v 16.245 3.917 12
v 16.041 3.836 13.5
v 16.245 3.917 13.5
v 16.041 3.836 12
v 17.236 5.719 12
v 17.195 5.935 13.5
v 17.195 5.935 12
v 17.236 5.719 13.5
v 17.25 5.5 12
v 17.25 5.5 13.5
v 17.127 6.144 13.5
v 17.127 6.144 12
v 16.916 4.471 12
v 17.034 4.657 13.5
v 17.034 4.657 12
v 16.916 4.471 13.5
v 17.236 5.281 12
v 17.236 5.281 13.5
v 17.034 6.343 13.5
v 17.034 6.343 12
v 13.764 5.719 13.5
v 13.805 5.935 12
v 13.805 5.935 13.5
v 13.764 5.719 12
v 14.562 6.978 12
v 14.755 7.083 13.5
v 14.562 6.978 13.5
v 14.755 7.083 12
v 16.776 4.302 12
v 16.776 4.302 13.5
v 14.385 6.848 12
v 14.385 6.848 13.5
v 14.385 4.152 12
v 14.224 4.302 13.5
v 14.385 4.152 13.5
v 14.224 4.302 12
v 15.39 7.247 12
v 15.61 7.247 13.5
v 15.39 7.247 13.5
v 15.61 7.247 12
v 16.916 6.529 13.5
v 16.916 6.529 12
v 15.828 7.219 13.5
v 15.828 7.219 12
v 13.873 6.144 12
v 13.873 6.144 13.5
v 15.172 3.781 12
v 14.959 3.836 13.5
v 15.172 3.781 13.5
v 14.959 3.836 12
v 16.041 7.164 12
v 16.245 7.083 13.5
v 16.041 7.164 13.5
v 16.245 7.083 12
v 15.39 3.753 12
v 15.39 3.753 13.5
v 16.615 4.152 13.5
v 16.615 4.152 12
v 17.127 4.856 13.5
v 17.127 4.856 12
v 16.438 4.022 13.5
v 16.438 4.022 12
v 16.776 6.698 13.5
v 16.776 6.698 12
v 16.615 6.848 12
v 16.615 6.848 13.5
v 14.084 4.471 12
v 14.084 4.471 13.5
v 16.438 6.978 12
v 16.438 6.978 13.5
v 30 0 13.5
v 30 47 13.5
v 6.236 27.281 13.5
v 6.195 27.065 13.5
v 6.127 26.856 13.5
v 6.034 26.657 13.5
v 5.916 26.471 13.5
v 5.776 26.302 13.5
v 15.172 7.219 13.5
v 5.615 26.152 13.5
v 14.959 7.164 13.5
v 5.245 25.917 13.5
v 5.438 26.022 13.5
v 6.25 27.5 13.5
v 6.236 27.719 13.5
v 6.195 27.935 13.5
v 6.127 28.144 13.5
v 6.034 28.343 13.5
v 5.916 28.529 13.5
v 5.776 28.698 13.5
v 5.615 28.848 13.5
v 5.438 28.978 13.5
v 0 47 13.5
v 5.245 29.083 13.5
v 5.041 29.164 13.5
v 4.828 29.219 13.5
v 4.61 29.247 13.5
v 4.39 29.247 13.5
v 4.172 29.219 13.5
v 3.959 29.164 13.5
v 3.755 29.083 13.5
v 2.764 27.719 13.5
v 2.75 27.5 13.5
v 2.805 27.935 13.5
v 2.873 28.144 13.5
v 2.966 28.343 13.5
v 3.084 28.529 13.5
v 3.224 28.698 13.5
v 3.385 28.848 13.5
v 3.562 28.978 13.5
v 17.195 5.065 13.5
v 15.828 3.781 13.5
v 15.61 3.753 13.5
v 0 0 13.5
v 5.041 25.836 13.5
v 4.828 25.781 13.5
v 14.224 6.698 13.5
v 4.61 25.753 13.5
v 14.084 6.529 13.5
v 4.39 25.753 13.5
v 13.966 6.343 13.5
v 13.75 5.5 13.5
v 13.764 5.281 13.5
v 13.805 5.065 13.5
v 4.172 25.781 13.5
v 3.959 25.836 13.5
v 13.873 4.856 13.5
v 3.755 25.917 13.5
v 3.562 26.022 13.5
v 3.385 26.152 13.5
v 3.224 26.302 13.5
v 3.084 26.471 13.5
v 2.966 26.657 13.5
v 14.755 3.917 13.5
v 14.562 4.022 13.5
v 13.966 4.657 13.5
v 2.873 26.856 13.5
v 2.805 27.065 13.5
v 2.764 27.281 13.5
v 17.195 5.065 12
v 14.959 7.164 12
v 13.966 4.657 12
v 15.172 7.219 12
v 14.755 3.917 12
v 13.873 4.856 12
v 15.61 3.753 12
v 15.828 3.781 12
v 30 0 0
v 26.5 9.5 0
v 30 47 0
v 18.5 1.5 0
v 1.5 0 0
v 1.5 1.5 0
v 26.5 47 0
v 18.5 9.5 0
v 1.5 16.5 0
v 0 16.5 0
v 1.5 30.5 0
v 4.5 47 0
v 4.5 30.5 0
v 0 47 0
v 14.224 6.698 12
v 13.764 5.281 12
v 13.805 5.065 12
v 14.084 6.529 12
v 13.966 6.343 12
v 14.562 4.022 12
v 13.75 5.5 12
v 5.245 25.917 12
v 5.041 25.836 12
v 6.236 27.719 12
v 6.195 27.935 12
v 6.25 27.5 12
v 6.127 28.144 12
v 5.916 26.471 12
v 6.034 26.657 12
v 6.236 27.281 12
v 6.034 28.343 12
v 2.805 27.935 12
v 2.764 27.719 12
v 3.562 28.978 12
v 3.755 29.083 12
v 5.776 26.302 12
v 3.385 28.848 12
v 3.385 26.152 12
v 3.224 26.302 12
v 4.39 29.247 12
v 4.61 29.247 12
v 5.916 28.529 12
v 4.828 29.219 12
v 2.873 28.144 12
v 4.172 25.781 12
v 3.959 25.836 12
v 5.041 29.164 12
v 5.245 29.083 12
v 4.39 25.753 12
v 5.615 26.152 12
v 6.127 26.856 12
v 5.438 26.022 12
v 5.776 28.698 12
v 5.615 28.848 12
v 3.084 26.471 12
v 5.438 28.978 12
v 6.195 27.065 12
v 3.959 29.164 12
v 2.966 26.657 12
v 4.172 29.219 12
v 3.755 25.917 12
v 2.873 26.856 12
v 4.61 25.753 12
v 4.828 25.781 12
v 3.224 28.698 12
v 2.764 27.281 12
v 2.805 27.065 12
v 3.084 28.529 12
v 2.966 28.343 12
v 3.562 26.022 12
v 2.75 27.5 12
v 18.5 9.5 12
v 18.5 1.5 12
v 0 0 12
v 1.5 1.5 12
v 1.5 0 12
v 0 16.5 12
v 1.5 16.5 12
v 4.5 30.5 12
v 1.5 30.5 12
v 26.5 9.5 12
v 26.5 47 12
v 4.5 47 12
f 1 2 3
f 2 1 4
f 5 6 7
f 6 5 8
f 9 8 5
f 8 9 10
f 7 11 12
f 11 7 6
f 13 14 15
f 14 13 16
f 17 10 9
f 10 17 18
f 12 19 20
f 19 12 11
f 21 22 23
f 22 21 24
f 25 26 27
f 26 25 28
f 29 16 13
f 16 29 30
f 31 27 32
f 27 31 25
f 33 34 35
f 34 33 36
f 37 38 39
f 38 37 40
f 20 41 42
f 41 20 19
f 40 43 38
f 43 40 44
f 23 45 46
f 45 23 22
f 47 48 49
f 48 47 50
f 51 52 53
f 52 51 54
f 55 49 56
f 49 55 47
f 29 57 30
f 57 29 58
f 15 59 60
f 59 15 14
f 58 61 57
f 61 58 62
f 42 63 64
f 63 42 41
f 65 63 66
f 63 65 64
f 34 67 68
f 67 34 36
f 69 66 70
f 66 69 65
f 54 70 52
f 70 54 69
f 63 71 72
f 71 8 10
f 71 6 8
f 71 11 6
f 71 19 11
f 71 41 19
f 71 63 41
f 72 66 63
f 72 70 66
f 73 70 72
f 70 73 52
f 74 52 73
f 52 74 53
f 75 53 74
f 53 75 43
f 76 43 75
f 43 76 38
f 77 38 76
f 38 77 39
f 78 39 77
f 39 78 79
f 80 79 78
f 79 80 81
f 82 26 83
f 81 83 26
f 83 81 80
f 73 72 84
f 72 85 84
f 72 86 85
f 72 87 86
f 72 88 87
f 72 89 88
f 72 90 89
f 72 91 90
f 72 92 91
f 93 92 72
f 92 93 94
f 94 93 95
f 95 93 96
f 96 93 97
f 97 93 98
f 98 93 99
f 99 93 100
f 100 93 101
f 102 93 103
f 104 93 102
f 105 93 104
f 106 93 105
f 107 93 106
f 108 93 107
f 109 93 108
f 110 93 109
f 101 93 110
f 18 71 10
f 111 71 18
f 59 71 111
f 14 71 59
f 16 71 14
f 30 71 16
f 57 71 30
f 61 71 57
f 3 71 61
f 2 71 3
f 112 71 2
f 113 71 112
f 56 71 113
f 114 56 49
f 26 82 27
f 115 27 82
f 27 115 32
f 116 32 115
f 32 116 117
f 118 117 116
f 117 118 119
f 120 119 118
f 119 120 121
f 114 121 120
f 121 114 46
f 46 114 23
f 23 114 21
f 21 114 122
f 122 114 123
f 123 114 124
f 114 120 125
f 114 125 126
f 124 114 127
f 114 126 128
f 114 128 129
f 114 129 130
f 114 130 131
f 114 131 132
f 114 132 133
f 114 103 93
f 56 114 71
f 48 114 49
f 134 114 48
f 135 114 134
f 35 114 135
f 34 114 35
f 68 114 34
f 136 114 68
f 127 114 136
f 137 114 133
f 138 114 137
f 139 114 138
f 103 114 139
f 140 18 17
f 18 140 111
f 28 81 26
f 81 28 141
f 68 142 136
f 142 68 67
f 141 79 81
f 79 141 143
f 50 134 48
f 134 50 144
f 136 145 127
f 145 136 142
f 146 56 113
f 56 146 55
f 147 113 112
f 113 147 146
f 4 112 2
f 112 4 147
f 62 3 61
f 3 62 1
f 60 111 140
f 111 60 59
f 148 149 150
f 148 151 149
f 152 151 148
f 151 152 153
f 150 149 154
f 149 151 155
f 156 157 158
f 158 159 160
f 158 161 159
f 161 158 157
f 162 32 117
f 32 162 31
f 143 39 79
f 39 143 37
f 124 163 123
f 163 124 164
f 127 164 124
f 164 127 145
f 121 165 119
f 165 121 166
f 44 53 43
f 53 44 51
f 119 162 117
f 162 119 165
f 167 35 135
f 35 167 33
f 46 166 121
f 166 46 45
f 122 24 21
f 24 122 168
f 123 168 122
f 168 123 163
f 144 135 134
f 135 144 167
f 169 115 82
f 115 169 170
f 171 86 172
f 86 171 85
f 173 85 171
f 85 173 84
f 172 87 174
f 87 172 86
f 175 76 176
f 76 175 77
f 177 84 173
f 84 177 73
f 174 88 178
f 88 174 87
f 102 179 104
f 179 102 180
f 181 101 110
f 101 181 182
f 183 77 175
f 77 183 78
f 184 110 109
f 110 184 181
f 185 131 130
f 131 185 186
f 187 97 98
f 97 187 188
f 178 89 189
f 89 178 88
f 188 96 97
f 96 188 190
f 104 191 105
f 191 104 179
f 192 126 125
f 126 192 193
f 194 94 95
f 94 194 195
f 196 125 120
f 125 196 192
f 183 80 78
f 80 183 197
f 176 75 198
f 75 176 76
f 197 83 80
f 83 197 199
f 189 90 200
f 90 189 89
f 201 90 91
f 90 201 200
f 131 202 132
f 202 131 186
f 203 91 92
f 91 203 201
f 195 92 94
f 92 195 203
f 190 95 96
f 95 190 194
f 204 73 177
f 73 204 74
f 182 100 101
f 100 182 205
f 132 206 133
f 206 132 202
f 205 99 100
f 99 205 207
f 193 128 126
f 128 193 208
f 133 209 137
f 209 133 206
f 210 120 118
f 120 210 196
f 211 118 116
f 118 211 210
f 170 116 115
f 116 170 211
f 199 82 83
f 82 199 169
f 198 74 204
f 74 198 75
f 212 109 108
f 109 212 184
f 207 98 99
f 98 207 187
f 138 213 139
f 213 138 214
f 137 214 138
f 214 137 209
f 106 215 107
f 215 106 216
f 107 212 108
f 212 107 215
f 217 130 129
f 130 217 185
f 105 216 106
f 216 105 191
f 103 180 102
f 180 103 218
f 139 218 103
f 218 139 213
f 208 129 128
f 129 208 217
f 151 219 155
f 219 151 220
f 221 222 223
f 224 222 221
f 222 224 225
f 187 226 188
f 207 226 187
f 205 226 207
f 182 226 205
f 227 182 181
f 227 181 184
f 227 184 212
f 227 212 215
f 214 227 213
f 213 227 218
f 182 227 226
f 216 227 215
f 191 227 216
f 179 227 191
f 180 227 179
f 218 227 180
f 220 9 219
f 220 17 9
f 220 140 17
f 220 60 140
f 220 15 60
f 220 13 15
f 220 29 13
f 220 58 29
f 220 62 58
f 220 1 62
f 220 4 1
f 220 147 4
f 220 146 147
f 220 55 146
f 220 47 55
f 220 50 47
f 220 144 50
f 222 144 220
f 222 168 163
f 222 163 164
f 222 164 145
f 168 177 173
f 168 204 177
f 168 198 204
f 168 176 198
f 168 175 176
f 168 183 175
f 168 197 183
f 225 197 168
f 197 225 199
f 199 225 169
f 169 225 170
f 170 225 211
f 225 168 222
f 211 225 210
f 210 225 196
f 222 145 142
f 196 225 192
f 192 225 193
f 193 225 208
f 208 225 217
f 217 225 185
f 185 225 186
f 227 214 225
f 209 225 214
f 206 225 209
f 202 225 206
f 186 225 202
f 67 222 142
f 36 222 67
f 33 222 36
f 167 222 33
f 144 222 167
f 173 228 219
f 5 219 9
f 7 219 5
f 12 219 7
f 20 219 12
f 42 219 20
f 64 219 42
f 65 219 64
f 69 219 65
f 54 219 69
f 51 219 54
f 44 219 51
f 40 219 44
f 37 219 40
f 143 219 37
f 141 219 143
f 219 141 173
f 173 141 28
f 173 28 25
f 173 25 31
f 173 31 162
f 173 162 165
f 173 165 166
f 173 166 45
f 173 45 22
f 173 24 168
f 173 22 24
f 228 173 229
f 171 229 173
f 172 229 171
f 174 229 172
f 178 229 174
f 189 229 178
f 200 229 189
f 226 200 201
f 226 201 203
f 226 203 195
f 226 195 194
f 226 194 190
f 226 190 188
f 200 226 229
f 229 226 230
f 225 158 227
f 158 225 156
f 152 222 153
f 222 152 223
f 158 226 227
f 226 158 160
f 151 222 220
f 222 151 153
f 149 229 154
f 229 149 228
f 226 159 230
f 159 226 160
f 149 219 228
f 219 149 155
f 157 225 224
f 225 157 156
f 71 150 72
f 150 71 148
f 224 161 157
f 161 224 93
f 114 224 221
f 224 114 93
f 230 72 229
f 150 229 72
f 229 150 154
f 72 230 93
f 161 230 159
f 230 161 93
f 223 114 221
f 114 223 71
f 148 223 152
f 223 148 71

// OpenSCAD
SWITCH_WIDTH = 17;
SWITCH_LENGTH = 29;
SWITCH_THICKNESS = 12;
SWITCH_OFFSET_X = 1.5;
SWITCH_OFFSET_Y = 1.5;

SWITCH_CONNECTOR_WIDTH = 22;
SWITCH_CONNECTOR_LENGTH = 38;
SWITCH_CONNECTOR_OFFSET_X = 3;
SWITCH_CONNECTOR_OFFSET_Y = 8;

SWITCH_BUTTON_WIDTH = 15;
SWITCH_BUTTON_LENGTH = 30;
SWITCH_BUTTON_OFFSET_X = -15;
SWITCH_BUTTON_OFFSET_Y = -15;

MOUNT_HOLE_OFFSET_X = SWITCH_WIDTH-3;
MOUNT_HOLE_OFFSET_Y = 4;
MOUNT_HOLE_SPACING_X = 11;
MOUNT_HOLE_SPACING_Y = 22;
MOUNT_HOLE_DIA = 3.5;

WALL_THICKNESS = 1.5;
WIDTH = SWITCH_WIDTH + 2 * WALL_THICKNESS + 10;
LENGTH = SWITCH_LENGTH + 2 * WALL_THICKNESS + 15;
THICKNESS = SWITCH_THICKNESS + WALL_THICKNESS;

$fn = 50;

module switch() {
  cube(size = [SWITCH_WIDTH, SWITCH_LENGTH, SWITCH_THICKNESS]);

  translate([SWITCH_CONNECTOR_OFFSET_X, SWITCH_CONNECTOR_OFFSET_Y, 0])
  cube(size = [SWITCH_CONNECTOR_WIDTH, SWITCH_CONNECTOR_LENGTH, SWITCH_THICKNESS]);

  translate([SWITCH_BUTTON_OFFSET_X, SWITCH_BUTTON_OFFSET_Y, 0])
  cube(size = [SWITCH_BUTTON_WIDTH, SWITCH_BUTTON_LENGTH, SWITCH_THICKNESS]);

  for(i = [0, 1]) {
    translate([-i * MOUNT_HOLE_SPACING_X + MOUNT_HOLE_OFFSET_X, i * MOUNT_HOLE_SPACING_Y + MOUNT_HOLE_OFFSET_Y, 0])
    cylinder(d = MOUNT_HOLE_DIA, h = THICKNESS);
  }
}

module cover() {
  difference() {
    cube(size = [WIDTH, LENGTH, THICKNESS]);

    #translate([SWITCH_OFFSET_X, SWITCH_OFFSET_Y, 0])
    switch();
  }
}

cover();
